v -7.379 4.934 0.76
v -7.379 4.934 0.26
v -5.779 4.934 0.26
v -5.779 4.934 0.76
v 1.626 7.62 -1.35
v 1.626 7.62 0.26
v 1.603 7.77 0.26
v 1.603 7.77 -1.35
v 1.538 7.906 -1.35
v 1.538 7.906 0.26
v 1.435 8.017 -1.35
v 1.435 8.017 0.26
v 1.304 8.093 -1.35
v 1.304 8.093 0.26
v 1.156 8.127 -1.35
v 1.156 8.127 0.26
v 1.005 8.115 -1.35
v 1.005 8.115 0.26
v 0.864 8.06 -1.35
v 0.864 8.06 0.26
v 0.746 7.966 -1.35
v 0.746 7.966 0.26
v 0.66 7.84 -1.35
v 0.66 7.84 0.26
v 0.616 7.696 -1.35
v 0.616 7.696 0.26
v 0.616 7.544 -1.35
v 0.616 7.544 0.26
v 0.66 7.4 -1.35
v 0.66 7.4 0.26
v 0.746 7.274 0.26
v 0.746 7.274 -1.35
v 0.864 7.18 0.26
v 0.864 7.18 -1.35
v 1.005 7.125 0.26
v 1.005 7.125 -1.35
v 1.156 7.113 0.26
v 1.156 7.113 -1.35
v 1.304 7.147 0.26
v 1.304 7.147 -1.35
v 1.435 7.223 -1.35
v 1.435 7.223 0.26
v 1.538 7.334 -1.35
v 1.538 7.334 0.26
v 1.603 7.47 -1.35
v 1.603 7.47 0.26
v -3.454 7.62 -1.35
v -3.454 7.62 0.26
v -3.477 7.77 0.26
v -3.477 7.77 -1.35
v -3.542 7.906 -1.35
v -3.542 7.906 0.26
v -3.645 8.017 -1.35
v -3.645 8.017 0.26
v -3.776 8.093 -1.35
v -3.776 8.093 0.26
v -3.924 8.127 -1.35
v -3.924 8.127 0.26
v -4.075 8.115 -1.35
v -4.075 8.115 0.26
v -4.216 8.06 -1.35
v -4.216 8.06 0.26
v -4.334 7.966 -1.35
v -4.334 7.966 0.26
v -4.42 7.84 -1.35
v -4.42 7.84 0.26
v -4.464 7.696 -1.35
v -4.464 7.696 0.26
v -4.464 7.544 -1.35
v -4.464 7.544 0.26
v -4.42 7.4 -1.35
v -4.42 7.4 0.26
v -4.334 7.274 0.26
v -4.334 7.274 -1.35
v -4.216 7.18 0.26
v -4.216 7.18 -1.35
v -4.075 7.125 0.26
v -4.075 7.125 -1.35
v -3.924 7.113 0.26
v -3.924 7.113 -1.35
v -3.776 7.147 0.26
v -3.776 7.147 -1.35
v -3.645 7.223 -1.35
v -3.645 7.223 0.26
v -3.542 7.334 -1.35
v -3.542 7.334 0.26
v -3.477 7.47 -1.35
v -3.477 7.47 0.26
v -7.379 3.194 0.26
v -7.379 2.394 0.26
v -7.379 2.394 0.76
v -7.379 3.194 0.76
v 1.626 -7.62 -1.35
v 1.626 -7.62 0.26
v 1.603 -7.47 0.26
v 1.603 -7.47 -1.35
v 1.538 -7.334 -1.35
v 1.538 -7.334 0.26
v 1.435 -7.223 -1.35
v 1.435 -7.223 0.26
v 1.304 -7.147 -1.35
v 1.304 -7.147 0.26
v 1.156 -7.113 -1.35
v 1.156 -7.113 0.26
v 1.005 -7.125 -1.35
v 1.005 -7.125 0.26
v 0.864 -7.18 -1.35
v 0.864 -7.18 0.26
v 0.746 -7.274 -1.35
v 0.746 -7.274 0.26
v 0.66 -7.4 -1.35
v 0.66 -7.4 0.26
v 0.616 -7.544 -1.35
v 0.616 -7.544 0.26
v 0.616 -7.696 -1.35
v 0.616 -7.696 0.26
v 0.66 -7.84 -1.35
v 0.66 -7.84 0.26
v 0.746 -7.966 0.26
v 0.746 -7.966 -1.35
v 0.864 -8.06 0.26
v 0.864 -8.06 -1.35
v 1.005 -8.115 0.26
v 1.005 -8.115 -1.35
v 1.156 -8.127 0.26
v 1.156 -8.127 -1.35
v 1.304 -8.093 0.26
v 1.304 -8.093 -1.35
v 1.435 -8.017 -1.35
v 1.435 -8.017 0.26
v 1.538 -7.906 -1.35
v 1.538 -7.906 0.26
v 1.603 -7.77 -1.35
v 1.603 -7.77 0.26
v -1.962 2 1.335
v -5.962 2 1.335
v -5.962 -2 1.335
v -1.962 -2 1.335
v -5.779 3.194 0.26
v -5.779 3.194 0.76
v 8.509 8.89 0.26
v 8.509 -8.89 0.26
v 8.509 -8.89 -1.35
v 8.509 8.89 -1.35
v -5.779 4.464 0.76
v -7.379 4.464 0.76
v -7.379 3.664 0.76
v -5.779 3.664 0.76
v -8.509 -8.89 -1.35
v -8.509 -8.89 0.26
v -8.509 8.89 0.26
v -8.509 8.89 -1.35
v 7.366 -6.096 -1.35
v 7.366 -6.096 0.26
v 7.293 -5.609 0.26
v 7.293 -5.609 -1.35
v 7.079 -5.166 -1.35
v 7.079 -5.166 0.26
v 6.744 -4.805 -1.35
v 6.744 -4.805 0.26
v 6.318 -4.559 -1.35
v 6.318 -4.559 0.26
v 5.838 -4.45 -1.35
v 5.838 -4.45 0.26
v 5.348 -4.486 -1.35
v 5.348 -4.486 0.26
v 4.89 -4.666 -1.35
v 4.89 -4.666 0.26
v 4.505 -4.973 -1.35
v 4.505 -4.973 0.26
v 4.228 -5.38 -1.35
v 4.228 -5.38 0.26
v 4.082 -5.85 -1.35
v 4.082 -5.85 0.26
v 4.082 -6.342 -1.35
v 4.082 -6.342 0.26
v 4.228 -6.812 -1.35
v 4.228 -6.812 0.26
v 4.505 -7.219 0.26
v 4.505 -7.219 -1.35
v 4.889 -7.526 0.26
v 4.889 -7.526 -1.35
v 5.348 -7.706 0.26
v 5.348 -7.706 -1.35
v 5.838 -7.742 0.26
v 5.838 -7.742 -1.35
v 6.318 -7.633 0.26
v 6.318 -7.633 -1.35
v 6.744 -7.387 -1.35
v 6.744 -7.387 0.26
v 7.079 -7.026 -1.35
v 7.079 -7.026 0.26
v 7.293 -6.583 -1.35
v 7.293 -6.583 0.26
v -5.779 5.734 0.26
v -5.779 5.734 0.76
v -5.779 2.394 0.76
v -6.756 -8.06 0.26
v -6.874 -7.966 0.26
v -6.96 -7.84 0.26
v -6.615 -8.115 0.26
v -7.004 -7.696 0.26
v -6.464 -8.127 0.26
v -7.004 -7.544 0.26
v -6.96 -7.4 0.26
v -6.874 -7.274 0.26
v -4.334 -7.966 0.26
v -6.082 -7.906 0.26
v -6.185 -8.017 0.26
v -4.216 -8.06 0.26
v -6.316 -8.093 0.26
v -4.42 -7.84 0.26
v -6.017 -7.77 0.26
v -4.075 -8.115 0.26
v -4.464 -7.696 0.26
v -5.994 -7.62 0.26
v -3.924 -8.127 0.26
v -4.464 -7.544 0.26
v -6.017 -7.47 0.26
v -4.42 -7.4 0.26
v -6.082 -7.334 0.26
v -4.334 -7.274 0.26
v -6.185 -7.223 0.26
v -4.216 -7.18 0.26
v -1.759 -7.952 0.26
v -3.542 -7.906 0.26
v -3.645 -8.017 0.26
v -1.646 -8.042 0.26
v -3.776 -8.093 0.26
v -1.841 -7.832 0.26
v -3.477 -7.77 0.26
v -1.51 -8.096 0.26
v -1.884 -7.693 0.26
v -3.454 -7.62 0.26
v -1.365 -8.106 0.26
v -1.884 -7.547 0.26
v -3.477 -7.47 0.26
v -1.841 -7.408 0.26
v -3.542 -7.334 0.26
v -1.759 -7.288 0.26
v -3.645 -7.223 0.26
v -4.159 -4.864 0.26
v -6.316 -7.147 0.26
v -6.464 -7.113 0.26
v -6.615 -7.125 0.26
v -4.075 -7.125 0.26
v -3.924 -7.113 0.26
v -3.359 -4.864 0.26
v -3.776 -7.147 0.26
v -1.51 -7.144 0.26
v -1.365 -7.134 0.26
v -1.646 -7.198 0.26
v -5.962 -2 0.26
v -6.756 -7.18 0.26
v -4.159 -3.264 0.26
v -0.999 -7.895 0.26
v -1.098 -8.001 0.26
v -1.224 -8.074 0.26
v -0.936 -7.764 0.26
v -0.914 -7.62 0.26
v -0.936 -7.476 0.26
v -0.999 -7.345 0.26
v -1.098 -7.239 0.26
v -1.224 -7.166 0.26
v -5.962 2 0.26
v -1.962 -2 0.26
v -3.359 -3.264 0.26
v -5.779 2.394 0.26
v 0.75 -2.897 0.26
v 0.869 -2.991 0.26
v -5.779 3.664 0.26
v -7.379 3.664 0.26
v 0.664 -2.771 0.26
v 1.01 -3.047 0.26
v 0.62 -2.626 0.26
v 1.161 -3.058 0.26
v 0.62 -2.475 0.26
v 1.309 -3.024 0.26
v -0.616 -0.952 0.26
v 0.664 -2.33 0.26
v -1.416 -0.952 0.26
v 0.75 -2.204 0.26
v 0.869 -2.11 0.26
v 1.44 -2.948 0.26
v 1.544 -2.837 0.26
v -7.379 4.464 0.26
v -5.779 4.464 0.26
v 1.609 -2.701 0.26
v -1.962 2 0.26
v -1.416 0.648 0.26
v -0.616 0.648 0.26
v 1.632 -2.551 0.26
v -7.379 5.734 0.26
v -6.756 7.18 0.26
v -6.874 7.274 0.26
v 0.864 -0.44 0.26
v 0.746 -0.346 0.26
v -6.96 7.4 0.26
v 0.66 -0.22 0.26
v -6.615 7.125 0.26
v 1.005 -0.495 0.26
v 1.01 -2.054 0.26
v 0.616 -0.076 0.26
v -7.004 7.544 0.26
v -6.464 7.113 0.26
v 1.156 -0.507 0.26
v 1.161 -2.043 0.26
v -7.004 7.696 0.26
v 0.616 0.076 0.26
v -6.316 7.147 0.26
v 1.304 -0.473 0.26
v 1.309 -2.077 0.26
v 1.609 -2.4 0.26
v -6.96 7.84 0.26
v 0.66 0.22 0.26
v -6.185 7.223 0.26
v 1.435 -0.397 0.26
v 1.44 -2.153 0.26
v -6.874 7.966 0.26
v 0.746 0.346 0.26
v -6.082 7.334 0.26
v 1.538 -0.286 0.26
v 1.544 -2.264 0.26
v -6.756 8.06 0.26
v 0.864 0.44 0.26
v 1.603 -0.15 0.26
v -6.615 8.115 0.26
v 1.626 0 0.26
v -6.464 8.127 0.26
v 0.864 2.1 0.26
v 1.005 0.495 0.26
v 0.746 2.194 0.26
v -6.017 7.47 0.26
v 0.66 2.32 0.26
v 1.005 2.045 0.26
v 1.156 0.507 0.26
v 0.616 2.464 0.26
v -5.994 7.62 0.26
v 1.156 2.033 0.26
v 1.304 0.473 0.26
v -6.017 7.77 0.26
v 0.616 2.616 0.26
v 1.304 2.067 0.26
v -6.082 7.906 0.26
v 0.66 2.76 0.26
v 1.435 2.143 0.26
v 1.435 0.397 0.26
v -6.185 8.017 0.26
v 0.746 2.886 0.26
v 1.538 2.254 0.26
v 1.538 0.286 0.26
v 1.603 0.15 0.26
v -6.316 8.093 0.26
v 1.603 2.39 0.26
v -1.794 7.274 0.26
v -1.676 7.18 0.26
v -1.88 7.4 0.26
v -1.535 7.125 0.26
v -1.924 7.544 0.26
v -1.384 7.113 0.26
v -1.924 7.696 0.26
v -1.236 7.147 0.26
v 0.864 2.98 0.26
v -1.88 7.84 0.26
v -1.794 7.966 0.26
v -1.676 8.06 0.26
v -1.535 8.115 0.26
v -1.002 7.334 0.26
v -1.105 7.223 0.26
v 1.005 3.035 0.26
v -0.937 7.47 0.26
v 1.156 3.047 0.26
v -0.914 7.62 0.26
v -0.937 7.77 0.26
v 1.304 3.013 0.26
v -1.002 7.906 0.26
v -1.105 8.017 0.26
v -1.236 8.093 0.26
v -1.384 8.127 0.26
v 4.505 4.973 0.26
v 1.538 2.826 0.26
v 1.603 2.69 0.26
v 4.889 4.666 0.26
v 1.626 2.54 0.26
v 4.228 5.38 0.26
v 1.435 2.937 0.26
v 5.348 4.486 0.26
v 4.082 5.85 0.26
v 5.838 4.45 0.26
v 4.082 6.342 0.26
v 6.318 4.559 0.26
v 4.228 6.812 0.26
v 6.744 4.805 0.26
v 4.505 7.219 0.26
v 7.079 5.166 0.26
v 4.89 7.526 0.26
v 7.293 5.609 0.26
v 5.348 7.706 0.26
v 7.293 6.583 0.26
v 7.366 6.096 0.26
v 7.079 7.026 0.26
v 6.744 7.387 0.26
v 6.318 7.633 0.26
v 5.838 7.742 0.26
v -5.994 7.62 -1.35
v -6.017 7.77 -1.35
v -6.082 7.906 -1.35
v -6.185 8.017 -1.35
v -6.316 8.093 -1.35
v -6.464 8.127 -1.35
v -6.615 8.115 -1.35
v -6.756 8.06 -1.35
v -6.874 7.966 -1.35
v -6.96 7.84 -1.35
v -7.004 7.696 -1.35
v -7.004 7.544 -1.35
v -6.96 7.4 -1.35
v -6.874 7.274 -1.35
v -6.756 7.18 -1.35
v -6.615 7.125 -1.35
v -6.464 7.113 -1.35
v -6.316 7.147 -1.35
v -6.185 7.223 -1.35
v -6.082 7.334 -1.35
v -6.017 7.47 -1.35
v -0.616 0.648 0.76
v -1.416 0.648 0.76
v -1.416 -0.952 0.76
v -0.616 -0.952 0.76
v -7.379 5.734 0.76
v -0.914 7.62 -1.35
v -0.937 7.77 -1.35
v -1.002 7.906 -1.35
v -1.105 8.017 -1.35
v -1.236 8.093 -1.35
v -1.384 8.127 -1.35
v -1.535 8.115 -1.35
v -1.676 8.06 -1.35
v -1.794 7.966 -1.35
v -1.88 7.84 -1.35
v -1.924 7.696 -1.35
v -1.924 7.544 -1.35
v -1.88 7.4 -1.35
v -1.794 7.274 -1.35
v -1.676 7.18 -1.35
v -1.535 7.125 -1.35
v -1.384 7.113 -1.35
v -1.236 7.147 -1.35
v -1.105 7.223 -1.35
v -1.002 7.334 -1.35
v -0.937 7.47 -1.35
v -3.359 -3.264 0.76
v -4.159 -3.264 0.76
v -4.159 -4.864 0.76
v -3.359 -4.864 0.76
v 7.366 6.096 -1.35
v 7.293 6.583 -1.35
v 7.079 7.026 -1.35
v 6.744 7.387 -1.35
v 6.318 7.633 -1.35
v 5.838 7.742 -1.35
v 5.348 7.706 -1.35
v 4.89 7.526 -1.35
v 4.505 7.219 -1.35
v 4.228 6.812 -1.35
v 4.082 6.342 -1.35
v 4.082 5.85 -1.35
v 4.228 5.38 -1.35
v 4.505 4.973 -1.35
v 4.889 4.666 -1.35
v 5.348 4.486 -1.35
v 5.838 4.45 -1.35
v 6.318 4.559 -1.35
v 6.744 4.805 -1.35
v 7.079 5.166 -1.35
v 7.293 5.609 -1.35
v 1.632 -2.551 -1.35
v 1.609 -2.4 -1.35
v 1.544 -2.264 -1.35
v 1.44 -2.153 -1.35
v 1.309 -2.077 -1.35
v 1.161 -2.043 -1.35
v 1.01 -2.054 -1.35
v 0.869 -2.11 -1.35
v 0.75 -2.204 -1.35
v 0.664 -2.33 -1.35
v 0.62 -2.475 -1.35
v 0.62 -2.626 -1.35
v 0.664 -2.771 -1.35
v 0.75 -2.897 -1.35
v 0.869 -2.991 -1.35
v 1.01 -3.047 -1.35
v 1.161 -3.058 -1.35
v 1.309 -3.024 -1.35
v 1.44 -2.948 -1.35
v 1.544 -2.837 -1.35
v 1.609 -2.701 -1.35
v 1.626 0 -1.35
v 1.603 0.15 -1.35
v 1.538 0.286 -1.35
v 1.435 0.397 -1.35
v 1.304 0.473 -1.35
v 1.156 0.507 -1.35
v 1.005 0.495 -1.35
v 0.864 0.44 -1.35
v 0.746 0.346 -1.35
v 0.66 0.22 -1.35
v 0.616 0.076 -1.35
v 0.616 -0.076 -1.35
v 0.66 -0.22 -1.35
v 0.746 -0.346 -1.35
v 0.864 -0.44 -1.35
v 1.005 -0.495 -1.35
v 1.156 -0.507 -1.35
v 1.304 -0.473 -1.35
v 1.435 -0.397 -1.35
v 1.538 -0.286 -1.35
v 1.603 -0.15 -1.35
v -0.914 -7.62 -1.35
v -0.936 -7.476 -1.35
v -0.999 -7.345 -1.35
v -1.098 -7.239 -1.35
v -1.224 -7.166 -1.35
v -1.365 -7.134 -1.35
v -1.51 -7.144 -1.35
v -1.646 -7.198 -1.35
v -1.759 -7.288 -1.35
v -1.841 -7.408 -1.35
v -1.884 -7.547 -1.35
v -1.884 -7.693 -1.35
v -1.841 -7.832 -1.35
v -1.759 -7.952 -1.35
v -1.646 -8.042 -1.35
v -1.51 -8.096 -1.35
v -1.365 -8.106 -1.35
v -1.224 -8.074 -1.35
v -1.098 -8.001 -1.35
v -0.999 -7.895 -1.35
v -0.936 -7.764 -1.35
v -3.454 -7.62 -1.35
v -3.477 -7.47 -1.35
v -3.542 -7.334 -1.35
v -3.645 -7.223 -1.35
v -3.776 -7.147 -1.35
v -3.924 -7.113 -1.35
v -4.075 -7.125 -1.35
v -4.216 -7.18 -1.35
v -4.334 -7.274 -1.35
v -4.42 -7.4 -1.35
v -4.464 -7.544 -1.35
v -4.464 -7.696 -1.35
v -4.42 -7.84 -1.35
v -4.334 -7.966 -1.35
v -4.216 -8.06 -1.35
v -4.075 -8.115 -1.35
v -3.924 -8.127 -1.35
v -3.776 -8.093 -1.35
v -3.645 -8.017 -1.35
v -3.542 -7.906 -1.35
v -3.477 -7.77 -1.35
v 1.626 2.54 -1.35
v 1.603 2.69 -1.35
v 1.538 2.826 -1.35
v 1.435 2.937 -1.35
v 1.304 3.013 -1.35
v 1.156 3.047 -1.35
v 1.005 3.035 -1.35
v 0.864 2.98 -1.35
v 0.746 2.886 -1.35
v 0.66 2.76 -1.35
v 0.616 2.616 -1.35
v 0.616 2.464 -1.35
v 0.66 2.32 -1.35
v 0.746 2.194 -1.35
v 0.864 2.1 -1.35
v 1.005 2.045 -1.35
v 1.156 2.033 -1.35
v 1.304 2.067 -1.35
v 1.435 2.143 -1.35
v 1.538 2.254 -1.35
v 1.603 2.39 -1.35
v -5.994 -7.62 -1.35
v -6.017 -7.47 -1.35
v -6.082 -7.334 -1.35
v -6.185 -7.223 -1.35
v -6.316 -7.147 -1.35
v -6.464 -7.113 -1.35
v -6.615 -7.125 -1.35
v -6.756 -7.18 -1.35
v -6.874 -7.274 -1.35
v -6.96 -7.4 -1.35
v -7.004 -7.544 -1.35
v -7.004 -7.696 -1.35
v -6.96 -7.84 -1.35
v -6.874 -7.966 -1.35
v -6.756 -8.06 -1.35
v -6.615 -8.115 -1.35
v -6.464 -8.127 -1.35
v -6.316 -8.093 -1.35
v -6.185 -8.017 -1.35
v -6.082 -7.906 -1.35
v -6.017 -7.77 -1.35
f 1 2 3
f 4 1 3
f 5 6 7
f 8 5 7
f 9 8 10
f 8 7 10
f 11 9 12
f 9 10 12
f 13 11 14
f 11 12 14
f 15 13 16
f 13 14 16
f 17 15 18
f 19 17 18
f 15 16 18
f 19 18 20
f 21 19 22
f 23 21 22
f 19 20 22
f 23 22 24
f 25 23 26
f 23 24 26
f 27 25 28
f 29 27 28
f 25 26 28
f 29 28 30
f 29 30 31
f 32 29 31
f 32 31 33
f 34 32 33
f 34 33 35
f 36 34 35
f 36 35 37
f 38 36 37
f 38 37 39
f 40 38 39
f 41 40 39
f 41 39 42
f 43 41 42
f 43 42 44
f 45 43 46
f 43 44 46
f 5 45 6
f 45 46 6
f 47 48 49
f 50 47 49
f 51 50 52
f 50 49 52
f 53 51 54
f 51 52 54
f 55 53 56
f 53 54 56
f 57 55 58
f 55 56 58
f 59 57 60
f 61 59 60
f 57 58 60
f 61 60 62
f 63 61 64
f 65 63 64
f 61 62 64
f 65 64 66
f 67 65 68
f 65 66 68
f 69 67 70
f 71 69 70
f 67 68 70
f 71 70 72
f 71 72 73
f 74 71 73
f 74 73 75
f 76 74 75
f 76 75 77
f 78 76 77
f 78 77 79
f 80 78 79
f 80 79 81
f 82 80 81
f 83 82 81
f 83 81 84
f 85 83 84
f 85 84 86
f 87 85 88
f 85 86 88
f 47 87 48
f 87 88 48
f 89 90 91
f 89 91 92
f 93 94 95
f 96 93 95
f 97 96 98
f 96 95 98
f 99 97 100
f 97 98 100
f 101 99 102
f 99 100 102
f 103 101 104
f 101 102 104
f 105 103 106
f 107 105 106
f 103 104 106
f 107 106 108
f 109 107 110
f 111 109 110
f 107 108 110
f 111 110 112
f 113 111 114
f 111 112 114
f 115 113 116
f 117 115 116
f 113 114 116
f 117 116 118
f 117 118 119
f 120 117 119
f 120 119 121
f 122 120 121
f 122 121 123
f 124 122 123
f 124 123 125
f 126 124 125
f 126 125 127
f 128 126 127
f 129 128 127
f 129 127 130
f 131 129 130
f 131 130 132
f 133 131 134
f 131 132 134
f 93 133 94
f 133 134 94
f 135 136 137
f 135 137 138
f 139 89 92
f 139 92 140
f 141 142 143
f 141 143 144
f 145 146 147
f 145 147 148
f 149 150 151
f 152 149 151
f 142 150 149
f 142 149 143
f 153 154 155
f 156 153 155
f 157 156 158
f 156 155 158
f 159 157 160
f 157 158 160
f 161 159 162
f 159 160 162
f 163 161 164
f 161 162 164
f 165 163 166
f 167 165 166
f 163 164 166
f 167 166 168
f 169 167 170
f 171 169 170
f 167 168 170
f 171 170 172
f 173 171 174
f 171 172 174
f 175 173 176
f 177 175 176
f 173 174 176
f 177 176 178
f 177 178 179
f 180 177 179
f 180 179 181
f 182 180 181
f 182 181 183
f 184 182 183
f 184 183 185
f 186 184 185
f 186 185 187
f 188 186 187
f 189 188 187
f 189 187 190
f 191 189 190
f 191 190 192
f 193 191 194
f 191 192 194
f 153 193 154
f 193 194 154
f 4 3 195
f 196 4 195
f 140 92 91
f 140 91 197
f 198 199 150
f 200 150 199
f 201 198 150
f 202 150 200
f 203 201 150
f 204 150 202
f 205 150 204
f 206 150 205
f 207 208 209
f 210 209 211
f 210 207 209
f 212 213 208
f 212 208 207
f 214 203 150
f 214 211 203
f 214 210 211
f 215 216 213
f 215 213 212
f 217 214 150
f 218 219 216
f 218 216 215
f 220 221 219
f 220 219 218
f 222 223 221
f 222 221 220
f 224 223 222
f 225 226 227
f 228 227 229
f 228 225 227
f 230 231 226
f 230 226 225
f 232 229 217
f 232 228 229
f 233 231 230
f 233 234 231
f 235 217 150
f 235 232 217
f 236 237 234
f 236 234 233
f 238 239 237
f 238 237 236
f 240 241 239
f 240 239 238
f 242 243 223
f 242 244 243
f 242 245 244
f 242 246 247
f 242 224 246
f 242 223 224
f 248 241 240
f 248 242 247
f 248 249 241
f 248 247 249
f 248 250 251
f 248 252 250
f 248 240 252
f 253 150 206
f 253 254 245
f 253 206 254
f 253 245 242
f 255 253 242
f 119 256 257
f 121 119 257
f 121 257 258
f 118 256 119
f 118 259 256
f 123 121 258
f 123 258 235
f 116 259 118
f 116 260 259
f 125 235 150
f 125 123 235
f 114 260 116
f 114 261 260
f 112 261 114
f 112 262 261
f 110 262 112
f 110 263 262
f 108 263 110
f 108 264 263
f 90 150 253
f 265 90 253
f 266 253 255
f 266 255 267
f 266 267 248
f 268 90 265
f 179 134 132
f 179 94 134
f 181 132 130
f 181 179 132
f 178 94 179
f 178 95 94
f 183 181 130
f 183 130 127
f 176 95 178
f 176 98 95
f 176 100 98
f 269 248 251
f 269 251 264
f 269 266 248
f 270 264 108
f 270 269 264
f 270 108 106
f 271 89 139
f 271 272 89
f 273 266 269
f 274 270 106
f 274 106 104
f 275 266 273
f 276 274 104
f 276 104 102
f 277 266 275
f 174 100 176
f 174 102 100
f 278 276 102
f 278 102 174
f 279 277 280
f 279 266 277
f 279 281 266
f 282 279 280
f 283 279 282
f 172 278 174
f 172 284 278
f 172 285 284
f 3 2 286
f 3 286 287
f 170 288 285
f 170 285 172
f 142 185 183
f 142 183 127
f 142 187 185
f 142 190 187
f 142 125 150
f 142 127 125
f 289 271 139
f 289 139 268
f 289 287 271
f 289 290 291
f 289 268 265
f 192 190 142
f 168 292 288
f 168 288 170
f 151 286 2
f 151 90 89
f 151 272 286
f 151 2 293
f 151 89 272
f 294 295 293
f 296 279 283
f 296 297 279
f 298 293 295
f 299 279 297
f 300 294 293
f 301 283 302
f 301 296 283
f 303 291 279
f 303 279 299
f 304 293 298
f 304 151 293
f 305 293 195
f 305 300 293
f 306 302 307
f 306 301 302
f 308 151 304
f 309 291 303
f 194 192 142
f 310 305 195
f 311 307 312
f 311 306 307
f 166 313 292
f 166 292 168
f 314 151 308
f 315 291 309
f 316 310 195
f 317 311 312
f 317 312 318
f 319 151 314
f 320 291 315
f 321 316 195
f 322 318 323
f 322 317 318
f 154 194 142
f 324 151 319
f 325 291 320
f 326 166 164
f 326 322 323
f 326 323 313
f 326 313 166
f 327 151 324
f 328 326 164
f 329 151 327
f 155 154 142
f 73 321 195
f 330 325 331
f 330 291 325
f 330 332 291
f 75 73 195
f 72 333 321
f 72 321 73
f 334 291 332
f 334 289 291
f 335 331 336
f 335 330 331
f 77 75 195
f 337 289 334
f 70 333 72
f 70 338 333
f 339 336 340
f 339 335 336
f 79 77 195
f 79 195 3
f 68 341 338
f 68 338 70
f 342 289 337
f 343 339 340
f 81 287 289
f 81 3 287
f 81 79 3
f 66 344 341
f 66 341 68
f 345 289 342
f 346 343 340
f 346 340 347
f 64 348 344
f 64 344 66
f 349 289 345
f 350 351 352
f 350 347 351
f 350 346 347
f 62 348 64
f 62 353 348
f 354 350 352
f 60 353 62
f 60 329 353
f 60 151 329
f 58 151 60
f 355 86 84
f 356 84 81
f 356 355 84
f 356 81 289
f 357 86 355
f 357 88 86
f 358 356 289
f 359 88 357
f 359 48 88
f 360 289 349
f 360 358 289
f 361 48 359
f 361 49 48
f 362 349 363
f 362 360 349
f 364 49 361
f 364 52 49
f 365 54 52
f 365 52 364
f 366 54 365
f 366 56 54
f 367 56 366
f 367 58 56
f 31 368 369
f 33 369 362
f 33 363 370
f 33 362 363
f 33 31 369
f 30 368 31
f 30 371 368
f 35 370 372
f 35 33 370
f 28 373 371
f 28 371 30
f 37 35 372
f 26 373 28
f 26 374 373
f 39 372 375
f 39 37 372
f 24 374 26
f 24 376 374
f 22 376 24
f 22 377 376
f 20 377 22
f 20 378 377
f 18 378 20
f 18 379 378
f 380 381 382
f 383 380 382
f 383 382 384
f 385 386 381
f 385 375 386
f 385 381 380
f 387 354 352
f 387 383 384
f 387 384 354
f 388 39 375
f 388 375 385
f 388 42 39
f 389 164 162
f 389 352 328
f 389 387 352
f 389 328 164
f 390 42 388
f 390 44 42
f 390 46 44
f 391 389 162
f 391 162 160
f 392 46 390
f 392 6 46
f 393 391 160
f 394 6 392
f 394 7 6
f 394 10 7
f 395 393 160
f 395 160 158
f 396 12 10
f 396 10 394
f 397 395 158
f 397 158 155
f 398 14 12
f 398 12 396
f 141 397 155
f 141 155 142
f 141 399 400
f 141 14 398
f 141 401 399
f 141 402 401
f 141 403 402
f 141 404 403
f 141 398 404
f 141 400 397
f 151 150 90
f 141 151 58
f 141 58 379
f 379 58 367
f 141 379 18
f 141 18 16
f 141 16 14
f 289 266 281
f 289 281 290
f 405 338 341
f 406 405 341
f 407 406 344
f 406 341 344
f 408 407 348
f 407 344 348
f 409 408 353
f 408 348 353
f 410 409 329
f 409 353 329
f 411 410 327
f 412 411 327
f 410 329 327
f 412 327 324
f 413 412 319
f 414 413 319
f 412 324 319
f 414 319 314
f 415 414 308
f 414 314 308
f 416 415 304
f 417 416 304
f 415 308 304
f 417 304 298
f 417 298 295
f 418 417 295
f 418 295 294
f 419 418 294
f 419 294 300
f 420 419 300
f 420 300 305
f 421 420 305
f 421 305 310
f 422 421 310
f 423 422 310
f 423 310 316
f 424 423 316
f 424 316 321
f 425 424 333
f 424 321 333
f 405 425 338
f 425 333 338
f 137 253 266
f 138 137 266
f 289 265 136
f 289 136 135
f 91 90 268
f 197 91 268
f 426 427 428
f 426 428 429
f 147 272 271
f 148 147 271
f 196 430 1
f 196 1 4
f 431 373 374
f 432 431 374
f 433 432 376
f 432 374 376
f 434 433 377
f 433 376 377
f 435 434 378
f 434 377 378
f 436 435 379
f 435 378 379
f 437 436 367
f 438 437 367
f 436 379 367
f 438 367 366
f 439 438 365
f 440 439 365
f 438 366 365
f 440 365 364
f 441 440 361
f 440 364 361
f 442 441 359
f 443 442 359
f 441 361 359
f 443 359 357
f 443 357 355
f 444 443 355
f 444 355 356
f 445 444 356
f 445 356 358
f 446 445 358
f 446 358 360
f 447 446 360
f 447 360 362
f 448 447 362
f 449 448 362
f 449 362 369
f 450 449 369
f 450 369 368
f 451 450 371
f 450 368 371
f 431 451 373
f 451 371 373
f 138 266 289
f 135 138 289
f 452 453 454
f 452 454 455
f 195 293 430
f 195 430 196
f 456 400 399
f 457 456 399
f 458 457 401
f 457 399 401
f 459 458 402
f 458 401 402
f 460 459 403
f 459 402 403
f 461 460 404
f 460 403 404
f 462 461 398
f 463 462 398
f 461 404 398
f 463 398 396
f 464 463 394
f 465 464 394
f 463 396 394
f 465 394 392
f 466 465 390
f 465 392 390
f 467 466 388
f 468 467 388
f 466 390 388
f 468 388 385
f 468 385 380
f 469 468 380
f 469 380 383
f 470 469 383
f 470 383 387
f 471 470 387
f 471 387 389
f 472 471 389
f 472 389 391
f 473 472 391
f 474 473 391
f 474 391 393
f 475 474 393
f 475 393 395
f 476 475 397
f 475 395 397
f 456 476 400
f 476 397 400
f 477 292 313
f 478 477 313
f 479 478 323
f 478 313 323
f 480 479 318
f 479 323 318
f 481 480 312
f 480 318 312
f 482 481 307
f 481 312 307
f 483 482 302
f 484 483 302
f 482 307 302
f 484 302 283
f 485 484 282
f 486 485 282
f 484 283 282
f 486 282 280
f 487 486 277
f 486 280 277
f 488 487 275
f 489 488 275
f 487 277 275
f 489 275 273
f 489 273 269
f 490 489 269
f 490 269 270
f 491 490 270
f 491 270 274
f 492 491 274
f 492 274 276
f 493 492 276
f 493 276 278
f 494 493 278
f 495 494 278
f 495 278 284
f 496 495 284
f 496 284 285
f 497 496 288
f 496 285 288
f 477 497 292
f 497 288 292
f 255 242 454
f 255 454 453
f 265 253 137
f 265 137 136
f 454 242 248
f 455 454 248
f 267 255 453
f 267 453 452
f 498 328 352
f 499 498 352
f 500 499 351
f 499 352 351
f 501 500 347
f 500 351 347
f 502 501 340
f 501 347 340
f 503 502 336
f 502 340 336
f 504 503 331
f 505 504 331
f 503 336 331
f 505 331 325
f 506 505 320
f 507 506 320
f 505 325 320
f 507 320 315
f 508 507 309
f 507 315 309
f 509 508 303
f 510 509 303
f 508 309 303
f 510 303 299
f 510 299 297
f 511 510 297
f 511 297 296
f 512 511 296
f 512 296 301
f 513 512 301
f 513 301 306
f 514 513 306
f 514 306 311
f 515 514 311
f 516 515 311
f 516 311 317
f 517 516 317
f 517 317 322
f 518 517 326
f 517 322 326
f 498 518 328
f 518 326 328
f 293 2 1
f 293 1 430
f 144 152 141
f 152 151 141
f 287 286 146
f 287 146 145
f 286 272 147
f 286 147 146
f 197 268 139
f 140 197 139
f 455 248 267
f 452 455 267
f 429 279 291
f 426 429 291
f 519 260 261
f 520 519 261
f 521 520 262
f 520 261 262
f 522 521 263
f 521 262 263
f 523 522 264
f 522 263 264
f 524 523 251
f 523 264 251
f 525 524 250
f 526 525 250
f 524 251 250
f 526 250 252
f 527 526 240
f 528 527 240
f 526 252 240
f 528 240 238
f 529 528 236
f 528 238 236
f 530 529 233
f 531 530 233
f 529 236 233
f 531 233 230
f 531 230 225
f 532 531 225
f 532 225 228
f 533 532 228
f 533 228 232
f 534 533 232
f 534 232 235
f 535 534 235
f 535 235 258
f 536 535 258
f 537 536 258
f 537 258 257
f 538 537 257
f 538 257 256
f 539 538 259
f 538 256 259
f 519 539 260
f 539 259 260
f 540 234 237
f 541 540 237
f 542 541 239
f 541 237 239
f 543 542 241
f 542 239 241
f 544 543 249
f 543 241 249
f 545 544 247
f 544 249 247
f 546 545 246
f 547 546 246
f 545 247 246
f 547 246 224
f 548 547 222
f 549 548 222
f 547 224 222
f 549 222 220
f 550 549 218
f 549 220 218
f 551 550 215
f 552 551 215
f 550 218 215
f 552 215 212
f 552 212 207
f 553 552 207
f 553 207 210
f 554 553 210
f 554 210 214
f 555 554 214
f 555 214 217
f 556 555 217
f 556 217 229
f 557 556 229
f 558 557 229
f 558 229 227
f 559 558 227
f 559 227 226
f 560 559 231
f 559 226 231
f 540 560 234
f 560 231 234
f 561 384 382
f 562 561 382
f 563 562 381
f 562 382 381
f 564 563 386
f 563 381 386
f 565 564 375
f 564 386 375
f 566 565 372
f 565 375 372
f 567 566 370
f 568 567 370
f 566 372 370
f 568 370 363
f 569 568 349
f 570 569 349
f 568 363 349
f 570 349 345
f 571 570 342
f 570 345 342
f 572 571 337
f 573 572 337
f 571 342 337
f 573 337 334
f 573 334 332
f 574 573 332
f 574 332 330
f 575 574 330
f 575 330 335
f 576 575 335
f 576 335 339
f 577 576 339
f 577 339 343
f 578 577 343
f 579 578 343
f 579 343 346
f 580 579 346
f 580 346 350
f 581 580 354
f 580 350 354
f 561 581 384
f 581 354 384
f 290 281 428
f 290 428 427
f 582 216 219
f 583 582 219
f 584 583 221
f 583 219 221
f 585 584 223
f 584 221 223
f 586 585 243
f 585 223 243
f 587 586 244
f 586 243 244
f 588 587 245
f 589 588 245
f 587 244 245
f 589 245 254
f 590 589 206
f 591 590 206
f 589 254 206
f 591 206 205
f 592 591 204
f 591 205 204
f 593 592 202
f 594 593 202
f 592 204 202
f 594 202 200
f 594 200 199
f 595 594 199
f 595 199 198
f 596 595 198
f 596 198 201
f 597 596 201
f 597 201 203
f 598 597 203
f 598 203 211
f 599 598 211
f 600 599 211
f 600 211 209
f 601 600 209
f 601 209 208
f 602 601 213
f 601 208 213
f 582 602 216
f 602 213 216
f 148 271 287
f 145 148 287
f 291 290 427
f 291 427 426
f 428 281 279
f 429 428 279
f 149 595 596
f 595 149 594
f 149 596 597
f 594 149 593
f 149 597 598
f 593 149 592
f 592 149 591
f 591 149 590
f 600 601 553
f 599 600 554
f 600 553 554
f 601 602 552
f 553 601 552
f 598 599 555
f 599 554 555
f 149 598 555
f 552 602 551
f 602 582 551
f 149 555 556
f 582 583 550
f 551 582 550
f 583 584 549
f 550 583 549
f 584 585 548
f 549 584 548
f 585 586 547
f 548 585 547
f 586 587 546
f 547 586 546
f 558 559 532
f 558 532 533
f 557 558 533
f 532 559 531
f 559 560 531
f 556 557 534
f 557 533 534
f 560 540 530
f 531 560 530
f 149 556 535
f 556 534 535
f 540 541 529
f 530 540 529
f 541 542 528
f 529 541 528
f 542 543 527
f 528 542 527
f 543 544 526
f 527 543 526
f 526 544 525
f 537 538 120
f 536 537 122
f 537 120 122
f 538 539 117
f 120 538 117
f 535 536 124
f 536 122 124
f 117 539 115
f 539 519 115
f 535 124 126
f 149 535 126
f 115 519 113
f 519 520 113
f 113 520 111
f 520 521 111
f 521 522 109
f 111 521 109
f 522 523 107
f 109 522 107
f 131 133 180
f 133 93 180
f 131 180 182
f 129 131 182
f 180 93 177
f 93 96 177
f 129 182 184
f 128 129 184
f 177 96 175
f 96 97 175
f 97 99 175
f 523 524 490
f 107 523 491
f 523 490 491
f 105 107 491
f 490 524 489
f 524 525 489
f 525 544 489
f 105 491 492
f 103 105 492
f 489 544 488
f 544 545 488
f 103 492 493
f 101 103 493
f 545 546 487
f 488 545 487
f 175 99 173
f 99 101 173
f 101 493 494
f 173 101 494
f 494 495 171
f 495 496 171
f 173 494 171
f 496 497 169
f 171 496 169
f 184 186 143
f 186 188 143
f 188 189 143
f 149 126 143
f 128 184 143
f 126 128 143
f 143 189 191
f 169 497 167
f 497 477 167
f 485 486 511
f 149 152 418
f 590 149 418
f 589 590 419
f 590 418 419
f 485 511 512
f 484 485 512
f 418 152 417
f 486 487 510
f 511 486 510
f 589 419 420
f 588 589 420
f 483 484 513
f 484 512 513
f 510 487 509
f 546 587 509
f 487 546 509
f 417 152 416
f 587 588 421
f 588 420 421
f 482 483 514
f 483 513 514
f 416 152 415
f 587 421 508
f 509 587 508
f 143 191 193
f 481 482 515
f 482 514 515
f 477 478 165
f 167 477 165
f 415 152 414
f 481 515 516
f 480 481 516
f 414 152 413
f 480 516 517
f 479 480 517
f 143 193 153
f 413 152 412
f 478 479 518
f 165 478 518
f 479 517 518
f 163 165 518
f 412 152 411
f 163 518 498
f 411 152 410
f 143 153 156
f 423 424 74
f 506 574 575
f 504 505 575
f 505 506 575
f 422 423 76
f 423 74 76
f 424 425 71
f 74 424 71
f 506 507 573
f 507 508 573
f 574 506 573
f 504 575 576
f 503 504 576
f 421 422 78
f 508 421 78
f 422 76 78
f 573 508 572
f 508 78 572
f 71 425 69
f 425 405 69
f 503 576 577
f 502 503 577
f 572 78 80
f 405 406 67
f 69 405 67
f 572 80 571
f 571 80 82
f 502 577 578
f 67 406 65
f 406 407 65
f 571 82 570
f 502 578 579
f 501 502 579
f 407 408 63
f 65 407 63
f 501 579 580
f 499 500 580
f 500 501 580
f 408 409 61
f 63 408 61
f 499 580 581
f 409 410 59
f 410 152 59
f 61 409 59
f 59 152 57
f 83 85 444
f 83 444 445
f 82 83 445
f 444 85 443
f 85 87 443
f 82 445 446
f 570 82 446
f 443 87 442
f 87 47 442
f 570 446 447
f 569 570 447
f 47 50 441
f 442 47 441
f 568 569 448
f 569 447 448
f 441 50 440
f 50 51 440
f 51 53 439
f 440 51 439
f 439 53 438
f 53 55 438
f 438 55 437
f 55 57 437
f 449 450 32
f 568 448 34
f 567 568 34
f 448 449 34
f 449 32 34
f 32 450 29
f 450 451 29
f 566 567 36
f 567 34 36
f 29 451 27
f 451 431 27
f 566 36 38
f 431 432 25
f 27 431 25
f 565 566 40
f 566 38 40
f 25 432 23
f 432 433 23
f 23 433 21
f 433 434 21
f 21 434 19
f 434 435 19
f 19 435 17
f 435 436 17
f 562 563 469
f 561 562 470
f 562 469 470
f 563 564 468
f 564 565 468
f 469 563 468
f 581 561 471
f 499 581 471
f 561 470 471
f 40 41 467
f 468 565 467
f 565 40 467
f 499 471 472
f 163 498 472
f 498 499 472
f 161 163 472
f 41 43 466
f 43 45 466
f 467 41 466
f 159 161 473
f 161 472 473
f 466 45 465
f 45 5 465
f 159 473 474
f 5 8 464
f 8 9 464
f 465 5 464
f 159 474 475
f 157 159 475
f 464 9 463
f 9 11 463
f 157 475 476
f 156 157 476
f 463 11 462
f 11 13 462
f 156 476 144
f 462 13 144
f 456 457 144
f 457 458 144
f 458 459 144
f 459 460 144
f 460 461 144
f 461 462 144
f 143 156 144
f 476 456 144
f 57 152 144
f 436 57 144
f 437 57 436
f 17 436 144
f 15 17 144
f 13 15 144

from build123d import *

# Parameters (mm, degrees)
F0_W     = 17.018
F0_H     = 17.78
F1_DEPTH = 0.26
F2_DEPTH = 1.35
F3_R     = 0.508
F3_R_2   = 0.509027
F3_R_3   = 0.487745
F3_R_4   = 1.651
F4_DEPTH = 1.61
F5_W     = 1.6
F5_H     = 0.8
F5_W_2   = 0.8
F5_H_2   = 1.6
F6_DEPTH = 0.5
F7_W     = 4
F7_H     = 4
F8_DEPTH = 1.075


with BuildPart() as f1:
    # F0 (on Top) → F1 (new body)
    with BuildSketch(Plane.XY):
        Rectangle(F0_W, F0_H)
    extrude(amount=F1_DEPTH)

    # F0 (on Top) → F2 (join)
    with BuildSketch(Plane.XY):
        Rectangle(F0_W, F0_H)
    extrude(amount=-F2_DEPTH)

    # F3 (on face) → F4 (cut, through all)
    with BuildSketch(Plane.XY.offset(0.26)):
        with Locations((-6.502, 7.62)):
            Circle(F3_R)
        with Locations((-3.962, 7.62)):
            Circle(F3_R)
        with Locations((-1.422, 7.62)):
            Circle(F3_R)
        with Locations((1.118, 7.62)):
            Circle(F3_R)
        with Locations((1.118, 2.54)):
            Circle(F3_R)
        with Locations((1.118, 0)):
            Circle(F3_R)
        with Locations((1.123042, -2.550522)):
            Circle(F3_R_2)
        with Locations((1.118, -7.62)):
            Circle(F3_R)
        with Locations((-1.401745, -7.62)):
            Circle(F3_R_3)
        with Locations((-3.962, -7.62)):
            Circle(F3_R)
        with Locations((-6.502, -7.62)):
            Circle(F3_R)
        with Locations((5.715, -6.096)):
            Circle(F3_R_4)
        with Locations((5.715, 6.096)):
            Circle(F3_R_4)
    extrude(amount=-F4_DEPTH, mode=Mode.SUBTRACT)

    # F5 (on face) → F6 (join)
    with BuildSketch(Plane.XY.offset(0.26)):
        with Locations((-6.579, 5.334)):
            Rectangle(F5_W, F5_H)
        with Locations((-6.579, 4.064)):
            Rectangle(F5_W, F5_H)
        with Locations((-6.579, 2.794)):
            Rectangle(F5_W, F5_H)
        with Locations((-1.016, -0.152)):
            Rectangle(F5_W_2, F5_H_2)
        with Locations((-3.759, -4.064)):
            Rectangle(F5_W_2, F5_H_2)
    extrude(amount=F6_DEPTH)

    # F7 (on face) → F8 (join)
    with BuildSketch(Plane.XY.offset(0.26)):
        with Locations((-3.962, 0)):
            Rectangle(F7_W, F7_H)
    extrude(amount=F8_DEPTH)


solid = f1.part
